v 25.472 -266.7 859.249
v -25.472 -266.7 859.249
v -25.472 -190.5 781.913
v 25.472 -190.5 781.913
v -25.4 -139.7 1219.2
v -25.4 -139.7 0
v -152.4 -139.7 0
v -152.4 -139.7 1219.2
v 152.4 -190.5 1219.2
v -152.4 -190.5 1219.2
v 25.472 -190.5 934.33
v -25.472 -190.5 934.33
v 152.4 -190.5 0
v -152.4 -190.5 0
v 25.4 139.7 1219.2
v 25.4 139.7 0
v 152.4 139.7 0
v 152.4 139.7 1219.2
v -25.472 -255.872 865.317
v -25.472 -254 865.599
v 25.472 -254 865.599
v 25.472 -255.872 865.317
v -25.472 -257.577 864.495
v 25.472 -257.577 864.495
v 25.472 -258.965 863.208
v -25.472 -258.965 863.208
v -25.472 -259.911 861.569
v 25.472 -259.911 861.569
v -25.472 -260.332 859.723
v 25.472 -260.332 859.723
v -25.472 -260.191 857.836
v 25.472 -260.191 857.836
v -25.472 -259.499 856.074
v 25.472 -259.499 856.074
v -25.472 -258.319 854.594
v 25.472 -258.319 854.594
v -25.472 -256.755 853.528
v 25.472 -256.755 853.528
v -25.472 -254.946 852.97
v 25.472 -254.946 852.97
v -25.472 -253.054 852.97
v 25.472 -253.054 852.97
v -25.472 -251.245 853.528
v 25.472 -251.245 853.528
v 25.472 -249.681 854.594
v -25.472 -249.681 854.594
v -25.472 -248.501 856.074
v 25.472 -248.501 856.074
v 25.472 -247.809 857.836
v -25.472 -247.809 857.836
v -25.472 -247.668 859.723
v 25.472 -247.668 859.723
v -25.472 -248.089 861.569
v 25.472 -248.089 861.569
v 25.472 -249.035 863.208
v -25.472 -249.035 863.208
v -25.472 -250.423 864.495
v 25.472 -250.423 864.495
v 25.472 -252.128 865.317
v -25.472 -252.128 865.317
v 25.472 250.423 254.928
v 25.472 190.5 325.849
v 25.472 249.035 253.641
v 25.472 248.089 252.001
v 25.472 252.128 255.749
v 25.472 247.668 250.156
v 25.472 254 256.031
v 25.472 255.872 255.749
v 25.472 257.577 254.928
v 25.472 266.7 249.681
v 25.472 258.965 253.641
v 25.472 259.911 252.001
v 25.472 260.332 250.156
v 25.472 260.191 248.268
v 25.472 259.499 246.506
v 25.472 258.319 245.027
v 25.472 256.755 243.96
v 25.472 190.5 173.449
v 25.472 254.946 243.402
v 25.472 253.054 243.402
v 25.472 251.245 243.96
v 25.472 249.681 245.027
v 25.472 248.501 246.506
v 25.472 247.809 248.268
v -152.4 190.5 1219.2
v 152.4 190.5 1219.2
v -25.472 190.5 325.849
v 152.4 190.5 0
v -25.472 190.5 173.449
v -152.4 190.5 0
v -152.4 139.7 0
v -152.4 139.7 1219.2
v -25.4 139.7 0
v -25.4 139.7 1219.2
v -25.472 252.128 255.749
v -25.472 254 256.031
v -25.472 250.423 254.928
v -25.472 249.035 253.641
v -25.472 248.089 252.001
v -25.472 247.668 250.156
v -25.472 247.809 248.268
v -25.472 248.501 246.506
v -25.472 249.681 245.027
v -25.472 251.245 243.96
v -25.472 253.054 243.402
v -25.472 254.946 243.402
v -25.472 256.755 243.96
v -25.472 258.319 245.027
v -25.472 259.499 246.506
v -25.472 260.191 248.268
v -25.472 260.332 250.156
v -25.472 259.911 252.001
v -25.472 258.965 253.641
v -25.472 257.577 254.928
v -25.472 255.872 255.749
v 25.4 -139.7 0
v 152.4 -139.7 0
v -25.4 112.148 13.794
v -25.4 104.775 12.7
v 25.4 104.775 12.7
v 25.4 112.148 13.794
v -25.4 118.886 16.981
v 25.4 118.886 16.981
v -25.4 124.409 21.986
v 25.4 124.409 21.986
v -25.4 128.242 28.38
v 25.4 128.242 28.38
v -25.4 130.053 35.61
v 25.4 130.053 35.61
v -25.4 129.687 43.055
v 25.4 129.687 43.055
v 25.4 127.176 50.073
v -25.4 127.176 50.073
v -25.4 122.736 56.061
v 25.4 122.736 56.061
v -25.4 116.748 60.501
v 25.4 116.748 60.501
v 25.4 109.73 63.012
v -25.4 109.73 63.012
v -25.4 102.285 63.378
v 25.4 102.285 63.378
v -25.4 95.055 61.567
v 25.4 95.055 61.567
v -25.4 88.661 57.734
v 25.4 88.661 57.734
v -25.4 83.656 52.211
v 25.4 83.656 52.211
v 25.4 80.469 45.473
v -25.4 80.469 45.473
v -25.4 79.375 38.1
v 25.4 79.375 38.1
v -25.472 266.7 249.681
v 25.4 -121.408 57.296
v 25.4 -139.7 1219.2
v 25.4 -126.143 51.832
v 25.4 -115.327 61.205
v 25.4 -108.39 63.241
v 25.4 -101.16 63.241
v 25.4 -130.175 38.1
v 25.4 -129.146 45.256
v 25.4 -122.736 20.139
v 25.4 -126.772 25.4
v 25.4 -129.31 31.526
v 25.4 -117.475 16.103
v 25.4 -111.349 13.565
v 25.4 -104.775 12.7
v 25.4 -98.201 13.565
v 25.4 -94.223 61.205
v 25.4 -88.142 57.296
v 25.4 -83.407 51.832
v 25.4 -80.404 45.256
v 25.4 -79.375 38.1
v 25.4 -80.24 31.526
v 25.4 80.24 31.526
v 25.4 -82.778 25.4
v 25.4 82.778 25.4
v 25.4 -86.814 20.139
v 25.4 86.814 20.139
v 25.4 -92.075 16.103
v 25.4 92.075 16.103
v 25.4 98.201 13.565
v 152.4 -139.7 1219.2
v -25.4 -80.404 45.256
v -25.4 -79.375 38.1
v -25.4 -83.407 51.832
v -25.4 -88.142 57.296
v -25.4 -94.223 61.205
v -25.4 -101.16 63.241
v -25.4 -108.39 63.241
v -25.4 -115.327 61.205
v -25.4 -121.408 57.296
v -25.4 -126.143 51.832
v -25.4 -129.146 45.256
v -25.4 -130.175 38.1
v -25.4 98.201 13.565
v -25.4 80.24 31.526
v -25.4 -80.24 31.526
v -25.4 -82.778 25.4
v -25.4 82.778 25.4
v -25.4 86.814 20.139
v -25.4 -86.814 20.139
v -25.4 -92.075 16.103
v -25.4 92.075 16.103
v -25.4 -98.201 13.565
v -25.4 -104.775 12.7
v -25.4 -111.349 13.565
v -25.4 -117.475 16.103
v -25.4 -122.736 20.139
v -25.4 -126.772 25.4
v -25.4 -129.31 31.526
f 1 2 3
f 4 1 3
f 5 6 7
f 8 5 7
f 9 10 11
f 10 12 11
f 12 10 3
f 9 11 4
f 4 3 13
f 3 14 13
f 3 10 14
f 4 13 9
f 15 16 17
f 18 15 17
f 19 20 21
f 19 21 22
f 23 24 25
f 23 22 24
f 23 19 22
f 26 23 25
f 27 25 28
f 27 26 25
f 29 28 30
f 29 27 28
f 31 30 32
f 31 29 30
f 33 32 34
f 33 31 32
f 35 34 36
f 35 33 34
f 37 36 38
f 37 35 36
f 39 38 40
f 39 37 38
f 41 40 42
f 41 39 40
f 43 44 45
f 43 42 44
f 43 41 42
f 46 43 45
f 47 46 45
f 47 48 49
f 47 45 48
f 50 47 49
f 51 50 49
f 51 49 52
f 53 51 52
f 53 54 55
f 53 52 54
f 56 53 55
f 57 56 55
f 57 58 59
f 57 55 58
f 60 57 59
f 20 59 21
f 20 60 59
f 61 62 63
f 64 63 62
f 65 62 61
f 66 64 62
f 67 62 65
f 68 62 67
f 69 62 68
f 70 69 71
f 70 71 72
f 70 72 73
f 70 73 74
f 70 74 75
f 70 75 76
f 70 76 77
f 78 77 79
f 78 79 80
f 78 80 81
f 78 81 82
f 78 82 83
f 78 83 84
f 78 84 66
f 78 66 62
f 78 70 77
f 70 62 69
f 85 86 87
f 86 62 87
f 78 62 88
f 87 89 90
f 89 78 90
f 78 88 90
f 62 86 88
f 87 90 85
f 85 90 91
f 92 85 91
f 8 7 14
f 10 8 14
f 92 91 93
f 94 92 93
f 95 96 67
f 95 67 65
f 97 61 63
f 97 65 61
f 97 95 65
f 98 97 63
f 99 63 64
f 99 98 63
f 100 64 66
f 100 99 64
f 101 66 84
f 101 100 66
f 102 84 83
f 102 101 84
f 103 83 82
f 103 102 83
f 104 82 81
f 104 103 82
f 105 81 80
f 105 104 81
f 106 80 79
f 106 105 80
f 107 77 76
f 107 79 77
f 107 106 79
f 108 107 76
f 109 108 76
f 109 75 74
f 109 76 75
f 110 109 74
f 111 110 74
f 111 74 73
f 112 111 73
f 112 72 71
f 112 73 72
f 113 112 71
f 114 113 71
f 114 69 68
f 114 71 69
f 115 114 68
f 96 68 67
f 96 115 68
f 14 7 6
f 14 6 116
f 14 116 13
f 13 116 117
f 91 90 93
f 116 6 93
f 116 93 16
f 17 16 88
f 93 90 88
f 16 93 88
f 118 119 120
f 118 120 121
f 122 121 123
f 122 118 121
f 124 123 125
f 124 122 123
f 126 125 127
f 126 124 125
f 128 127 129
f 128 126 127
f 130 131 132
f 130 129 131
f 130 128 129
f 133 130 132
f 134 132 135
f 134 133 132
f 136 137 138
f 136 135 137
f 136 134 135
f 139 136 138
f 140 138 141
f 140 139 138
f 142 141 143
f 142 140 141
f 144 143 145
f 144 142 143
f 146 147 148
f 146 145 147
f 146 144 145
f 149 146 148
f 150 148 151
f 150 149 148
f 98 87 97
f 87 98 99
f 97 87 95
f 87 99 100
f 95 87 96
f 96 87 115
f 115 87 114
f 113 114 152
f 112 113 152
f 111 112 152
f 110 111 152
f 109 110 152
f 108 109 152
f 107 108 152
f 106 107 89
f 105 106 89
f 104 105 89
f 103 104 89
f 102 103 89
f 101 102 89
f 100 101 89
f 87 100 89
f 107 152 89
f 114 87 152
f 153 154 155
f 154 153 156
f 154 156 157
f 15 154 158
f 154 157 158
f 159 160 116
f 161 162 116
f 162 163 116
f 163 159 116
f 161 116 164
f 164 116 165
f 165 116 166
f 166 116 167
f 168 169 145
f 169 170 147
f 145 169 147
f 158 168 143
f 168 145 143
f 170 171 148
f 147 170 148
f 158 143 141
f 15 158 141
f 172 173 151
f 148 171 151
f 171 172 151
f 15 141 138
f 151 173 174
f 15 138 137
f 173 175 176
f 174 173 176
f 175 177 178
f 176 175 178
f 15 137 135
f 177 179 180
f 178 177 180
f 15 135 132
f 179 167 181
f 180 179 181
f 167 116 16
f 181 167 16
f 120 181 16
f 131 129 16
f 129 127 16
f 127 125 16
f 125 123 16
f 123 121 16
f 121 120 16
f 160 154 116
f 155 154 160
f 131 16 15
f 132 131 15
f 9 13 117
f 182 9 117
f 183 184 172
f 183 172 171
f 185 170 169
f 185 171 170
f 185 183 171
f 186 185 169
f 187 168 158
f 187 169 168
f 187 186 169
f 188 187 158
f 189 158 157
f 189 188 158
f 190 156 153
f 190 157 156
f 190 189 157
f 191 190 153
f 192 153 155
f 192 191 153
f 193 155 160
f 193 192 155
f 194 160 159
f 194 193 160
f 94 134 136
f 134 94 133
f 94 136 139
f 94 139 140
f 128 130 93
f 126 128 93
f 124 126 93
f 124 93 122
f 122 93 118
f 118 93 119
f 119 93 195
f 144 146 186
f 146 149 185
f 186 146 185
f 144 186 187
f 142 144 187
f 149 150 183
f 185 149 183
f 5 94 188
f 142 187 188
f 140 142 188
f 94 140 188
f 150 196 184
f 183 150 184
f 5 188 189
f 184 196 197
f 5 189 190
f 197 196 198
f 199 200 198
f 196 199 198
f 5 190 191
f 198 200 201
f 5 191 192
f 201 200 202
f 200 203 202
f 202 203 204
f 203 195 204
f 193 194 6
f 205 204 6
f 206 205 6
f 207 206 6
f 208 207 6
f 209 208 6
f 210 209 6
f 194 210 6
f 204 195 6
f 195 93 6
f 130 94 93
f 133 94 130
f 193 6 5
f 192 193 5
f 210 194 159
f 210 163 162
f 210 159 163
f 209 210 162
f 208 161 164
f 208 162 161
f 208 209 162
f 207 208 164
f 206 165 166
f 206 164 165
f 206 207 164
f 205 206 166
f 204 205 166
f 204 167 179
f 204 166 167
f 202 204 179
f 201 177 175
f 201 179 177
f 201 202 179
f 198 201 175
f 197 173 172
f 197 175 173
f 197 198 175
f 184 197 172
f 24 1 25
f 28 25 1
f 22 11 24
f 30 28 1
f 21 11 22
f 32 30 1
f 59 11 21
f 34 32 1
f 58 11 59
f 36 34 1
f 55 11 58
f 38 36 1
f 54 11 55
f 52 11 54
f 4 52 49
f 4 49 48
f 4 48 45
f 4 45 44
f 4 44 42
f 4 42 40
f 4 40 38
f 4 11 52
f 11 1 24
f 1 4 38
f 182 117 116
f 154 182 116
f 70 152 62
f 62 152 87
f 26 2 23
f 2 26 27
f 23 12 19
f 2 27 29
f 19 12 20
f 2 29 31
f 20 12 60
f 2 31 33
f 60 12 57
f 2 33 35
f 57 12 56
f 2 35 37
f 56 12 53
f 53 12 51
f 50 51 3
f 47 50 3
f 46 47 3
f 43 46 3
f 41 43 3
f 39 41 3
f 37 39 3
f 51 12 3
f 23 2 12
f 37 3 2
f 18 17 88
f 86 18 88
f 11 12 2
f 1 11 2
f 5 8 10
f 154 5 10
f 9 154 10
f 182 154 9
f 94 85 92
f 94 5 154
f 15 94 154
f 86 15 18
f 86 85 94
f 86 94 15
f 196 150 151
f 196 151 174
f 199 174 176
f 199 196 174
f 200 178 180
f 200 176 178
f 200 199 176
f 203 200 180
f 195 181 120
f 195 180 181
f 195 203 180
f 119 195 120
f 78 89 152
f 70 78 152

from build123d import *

# Parameters (mm, degrees)
BOSS_EXTRUDE1_DEPTH      = 1219.2
BOSS_EXTRUDE2_DEPTH      = 0.072177487
BOSS_EXTRUDE2_DEPTH_BACK = 50.872177487
BOSS_EXTRUDE3_DEPTH      = 0.072177487
BOSS_EXTRUDE3_DEPTH_BACK = 50.872177487
CUT_EXTRUDE1_DEPTH       = 101.6
CUT_EXTRUDE1_DEPTH_BACK  = 101.6
CUT_EXTRUDE3_DEPTH       = 76.2
CUT_EXTRUDE3_DEPTH_BACK  = 76.2
SKETCH7_R                = 6.35


with BuildPart() as part:
    # Sketch1 → Boss-Extrude1 (new body)
    with BuildSketch(Plane.XY):
        Polygon((152.4, 190.5), (-152.4, 190.5), (-152.4, 139.7), (-25.4, 139.7), (-25.4, -139.7), (-152.4, -139.7), (-152.4, -190.5), (152.4, -190.5), (152.4, -139.7), (25.4, -139.7), (25.4, 139.7), (152.4, 139.7), align=None)
    extrude(amount=BOSS_EXTRUDE1_DEPTH)

    # Sketch3 → Boss-Extrude2 (add, two sides: drawn at the far end of the back side and taken through both)
    with BuildSketch(Plane(origin=(25.4, 0, 0), x_dir=(0, 0, -1), z_dir=(1, 0, 0)).offset(-BOSS_EXTRUDE2_DEPTH_BACK)):
        Polygon((-325.848703736, 190.5), (-249.681440183, 190.5), (-249.681440183, 266.7), align=None)
        Polygon((-249.681440183, 266.7), (-249.681440183, 190.5), (-173.448689666, 190.5), align=None)
    extrude(amount=BOSS_EXTRUDE2_DEPTH + BOSS_EXTRUDE2_DEPTH_BACK)

    # Sketch4 → Boss-Extrude3 (add, two sides: drawn at the far end of the back side and taken through both)
    with BuildSketch(Plane(origin=(25.4, 0, 0), x_dir=(0, 0, -1), z_dir=(1, 0, 0)).offset(-BOSS_EXTRUDE3_DEPTH_BACK)):
        Polygon((-859.248696701, -266.7), (-859.248696701, -190.5), (-934.329981547, -190.5), align=None)
        Polygon((-781.913312631, -190.5), (-859.248696701, -190.5), (-859.248696701, -266.7), align=None)
    extrude(amount=BOSS_EXTRUDE3_DEPTH + BOSS_EXTRUDE3_DEPTH_BACK)

    # Sketch6 → Cut-Extrude1 (cut, two sides: drawn at the far end of the back side and taken through both)
    with BuildSketch(Plane(origin=(25.4, 0, 0), x_dir=(0, 0, -1), z_dir=(1, 0, 0)).offset(-CUT_EXTRUDE1_DEPTH_BACK)):
        with BuildLine():
            ThreePointArc((-38.1, 79.375), (-20.139487758, 86.814487758), (-12.7, 104.775))
            Line((-12.7, 104.775), (-38.1, 104.775))
            Line((-38.1, 104.775), (-38.1, 79.375))
        make_face()
        with BuildLine():
            Line((-38.1, 104.775), (-12.7, 104.775))
            ThreePointArc((-12.7, 104.775), (-56.060512242, 122.735512242), (-38.1, 79.375))
            Line((-38.1, 79.375), (-38.1, 104.775))
        make_face()
        with BuildLine():
            Line((-38.1, -130.175), (-38.1, -104.775))
            Line((-38.1, -104.775), (-38.1, -79.375))
            ThreePointArc((-38.1, -79.375), (-63.5, -104.775), (-38.1, -130.175))
        make_face()
        with BuildLine():
            ThreePointArc((-38.1, -130.175), (-20.139487758, -122.735512242), (-12.7, -104.775))
            Line((-12.7, -104.775), (-38.1, -104.775))
            Line((-38.1, -104.775), (-38.1, -130.175))
        make_face()
        with BuildLine():
            Line((-38.1, -104.775), (-12.7, -104.775))
            ThreePointArc((-12.7, -104.775), (-20.139487758, -86.814487758), (-38.1, -79.375))
            Line((-38.1, -79.375), (-38.1, -104.775))
        make_face()
    extrude(amount=CUT_EXTRUDE1_DEPTH + CUT_EXTRUDE1_DEPTH_BACK, mode=Mode.SUBTRACT)

    # Sketch7 → Cut-Extrude3 (cut, two sides: drawn at the far end of the back side and taken through both)
    with BuildSketch(Plane(origin=(25.472177487, 0, 0), x_dir=(0, 0, -1), z_dir=(1, 0, 0)).offset(-CUT_EXTRUDE3_DEPTH_BACK)):
        with Locations(Location((-249.681440183, 254, 0), (0, 0, 180))):
            Circle(SKETCH7_R)
        with Locations(Location((-859.248696701, -254, 0), (0, 0, 180))):
            Circle(SKETCH7_R)
    extrude(amount=CUT_EXTRUDE3_DEPTH + CUT_EXTRUDE3_DEPTH_BACK, mode=Mode.SUBTRACT)


solid = part.part
